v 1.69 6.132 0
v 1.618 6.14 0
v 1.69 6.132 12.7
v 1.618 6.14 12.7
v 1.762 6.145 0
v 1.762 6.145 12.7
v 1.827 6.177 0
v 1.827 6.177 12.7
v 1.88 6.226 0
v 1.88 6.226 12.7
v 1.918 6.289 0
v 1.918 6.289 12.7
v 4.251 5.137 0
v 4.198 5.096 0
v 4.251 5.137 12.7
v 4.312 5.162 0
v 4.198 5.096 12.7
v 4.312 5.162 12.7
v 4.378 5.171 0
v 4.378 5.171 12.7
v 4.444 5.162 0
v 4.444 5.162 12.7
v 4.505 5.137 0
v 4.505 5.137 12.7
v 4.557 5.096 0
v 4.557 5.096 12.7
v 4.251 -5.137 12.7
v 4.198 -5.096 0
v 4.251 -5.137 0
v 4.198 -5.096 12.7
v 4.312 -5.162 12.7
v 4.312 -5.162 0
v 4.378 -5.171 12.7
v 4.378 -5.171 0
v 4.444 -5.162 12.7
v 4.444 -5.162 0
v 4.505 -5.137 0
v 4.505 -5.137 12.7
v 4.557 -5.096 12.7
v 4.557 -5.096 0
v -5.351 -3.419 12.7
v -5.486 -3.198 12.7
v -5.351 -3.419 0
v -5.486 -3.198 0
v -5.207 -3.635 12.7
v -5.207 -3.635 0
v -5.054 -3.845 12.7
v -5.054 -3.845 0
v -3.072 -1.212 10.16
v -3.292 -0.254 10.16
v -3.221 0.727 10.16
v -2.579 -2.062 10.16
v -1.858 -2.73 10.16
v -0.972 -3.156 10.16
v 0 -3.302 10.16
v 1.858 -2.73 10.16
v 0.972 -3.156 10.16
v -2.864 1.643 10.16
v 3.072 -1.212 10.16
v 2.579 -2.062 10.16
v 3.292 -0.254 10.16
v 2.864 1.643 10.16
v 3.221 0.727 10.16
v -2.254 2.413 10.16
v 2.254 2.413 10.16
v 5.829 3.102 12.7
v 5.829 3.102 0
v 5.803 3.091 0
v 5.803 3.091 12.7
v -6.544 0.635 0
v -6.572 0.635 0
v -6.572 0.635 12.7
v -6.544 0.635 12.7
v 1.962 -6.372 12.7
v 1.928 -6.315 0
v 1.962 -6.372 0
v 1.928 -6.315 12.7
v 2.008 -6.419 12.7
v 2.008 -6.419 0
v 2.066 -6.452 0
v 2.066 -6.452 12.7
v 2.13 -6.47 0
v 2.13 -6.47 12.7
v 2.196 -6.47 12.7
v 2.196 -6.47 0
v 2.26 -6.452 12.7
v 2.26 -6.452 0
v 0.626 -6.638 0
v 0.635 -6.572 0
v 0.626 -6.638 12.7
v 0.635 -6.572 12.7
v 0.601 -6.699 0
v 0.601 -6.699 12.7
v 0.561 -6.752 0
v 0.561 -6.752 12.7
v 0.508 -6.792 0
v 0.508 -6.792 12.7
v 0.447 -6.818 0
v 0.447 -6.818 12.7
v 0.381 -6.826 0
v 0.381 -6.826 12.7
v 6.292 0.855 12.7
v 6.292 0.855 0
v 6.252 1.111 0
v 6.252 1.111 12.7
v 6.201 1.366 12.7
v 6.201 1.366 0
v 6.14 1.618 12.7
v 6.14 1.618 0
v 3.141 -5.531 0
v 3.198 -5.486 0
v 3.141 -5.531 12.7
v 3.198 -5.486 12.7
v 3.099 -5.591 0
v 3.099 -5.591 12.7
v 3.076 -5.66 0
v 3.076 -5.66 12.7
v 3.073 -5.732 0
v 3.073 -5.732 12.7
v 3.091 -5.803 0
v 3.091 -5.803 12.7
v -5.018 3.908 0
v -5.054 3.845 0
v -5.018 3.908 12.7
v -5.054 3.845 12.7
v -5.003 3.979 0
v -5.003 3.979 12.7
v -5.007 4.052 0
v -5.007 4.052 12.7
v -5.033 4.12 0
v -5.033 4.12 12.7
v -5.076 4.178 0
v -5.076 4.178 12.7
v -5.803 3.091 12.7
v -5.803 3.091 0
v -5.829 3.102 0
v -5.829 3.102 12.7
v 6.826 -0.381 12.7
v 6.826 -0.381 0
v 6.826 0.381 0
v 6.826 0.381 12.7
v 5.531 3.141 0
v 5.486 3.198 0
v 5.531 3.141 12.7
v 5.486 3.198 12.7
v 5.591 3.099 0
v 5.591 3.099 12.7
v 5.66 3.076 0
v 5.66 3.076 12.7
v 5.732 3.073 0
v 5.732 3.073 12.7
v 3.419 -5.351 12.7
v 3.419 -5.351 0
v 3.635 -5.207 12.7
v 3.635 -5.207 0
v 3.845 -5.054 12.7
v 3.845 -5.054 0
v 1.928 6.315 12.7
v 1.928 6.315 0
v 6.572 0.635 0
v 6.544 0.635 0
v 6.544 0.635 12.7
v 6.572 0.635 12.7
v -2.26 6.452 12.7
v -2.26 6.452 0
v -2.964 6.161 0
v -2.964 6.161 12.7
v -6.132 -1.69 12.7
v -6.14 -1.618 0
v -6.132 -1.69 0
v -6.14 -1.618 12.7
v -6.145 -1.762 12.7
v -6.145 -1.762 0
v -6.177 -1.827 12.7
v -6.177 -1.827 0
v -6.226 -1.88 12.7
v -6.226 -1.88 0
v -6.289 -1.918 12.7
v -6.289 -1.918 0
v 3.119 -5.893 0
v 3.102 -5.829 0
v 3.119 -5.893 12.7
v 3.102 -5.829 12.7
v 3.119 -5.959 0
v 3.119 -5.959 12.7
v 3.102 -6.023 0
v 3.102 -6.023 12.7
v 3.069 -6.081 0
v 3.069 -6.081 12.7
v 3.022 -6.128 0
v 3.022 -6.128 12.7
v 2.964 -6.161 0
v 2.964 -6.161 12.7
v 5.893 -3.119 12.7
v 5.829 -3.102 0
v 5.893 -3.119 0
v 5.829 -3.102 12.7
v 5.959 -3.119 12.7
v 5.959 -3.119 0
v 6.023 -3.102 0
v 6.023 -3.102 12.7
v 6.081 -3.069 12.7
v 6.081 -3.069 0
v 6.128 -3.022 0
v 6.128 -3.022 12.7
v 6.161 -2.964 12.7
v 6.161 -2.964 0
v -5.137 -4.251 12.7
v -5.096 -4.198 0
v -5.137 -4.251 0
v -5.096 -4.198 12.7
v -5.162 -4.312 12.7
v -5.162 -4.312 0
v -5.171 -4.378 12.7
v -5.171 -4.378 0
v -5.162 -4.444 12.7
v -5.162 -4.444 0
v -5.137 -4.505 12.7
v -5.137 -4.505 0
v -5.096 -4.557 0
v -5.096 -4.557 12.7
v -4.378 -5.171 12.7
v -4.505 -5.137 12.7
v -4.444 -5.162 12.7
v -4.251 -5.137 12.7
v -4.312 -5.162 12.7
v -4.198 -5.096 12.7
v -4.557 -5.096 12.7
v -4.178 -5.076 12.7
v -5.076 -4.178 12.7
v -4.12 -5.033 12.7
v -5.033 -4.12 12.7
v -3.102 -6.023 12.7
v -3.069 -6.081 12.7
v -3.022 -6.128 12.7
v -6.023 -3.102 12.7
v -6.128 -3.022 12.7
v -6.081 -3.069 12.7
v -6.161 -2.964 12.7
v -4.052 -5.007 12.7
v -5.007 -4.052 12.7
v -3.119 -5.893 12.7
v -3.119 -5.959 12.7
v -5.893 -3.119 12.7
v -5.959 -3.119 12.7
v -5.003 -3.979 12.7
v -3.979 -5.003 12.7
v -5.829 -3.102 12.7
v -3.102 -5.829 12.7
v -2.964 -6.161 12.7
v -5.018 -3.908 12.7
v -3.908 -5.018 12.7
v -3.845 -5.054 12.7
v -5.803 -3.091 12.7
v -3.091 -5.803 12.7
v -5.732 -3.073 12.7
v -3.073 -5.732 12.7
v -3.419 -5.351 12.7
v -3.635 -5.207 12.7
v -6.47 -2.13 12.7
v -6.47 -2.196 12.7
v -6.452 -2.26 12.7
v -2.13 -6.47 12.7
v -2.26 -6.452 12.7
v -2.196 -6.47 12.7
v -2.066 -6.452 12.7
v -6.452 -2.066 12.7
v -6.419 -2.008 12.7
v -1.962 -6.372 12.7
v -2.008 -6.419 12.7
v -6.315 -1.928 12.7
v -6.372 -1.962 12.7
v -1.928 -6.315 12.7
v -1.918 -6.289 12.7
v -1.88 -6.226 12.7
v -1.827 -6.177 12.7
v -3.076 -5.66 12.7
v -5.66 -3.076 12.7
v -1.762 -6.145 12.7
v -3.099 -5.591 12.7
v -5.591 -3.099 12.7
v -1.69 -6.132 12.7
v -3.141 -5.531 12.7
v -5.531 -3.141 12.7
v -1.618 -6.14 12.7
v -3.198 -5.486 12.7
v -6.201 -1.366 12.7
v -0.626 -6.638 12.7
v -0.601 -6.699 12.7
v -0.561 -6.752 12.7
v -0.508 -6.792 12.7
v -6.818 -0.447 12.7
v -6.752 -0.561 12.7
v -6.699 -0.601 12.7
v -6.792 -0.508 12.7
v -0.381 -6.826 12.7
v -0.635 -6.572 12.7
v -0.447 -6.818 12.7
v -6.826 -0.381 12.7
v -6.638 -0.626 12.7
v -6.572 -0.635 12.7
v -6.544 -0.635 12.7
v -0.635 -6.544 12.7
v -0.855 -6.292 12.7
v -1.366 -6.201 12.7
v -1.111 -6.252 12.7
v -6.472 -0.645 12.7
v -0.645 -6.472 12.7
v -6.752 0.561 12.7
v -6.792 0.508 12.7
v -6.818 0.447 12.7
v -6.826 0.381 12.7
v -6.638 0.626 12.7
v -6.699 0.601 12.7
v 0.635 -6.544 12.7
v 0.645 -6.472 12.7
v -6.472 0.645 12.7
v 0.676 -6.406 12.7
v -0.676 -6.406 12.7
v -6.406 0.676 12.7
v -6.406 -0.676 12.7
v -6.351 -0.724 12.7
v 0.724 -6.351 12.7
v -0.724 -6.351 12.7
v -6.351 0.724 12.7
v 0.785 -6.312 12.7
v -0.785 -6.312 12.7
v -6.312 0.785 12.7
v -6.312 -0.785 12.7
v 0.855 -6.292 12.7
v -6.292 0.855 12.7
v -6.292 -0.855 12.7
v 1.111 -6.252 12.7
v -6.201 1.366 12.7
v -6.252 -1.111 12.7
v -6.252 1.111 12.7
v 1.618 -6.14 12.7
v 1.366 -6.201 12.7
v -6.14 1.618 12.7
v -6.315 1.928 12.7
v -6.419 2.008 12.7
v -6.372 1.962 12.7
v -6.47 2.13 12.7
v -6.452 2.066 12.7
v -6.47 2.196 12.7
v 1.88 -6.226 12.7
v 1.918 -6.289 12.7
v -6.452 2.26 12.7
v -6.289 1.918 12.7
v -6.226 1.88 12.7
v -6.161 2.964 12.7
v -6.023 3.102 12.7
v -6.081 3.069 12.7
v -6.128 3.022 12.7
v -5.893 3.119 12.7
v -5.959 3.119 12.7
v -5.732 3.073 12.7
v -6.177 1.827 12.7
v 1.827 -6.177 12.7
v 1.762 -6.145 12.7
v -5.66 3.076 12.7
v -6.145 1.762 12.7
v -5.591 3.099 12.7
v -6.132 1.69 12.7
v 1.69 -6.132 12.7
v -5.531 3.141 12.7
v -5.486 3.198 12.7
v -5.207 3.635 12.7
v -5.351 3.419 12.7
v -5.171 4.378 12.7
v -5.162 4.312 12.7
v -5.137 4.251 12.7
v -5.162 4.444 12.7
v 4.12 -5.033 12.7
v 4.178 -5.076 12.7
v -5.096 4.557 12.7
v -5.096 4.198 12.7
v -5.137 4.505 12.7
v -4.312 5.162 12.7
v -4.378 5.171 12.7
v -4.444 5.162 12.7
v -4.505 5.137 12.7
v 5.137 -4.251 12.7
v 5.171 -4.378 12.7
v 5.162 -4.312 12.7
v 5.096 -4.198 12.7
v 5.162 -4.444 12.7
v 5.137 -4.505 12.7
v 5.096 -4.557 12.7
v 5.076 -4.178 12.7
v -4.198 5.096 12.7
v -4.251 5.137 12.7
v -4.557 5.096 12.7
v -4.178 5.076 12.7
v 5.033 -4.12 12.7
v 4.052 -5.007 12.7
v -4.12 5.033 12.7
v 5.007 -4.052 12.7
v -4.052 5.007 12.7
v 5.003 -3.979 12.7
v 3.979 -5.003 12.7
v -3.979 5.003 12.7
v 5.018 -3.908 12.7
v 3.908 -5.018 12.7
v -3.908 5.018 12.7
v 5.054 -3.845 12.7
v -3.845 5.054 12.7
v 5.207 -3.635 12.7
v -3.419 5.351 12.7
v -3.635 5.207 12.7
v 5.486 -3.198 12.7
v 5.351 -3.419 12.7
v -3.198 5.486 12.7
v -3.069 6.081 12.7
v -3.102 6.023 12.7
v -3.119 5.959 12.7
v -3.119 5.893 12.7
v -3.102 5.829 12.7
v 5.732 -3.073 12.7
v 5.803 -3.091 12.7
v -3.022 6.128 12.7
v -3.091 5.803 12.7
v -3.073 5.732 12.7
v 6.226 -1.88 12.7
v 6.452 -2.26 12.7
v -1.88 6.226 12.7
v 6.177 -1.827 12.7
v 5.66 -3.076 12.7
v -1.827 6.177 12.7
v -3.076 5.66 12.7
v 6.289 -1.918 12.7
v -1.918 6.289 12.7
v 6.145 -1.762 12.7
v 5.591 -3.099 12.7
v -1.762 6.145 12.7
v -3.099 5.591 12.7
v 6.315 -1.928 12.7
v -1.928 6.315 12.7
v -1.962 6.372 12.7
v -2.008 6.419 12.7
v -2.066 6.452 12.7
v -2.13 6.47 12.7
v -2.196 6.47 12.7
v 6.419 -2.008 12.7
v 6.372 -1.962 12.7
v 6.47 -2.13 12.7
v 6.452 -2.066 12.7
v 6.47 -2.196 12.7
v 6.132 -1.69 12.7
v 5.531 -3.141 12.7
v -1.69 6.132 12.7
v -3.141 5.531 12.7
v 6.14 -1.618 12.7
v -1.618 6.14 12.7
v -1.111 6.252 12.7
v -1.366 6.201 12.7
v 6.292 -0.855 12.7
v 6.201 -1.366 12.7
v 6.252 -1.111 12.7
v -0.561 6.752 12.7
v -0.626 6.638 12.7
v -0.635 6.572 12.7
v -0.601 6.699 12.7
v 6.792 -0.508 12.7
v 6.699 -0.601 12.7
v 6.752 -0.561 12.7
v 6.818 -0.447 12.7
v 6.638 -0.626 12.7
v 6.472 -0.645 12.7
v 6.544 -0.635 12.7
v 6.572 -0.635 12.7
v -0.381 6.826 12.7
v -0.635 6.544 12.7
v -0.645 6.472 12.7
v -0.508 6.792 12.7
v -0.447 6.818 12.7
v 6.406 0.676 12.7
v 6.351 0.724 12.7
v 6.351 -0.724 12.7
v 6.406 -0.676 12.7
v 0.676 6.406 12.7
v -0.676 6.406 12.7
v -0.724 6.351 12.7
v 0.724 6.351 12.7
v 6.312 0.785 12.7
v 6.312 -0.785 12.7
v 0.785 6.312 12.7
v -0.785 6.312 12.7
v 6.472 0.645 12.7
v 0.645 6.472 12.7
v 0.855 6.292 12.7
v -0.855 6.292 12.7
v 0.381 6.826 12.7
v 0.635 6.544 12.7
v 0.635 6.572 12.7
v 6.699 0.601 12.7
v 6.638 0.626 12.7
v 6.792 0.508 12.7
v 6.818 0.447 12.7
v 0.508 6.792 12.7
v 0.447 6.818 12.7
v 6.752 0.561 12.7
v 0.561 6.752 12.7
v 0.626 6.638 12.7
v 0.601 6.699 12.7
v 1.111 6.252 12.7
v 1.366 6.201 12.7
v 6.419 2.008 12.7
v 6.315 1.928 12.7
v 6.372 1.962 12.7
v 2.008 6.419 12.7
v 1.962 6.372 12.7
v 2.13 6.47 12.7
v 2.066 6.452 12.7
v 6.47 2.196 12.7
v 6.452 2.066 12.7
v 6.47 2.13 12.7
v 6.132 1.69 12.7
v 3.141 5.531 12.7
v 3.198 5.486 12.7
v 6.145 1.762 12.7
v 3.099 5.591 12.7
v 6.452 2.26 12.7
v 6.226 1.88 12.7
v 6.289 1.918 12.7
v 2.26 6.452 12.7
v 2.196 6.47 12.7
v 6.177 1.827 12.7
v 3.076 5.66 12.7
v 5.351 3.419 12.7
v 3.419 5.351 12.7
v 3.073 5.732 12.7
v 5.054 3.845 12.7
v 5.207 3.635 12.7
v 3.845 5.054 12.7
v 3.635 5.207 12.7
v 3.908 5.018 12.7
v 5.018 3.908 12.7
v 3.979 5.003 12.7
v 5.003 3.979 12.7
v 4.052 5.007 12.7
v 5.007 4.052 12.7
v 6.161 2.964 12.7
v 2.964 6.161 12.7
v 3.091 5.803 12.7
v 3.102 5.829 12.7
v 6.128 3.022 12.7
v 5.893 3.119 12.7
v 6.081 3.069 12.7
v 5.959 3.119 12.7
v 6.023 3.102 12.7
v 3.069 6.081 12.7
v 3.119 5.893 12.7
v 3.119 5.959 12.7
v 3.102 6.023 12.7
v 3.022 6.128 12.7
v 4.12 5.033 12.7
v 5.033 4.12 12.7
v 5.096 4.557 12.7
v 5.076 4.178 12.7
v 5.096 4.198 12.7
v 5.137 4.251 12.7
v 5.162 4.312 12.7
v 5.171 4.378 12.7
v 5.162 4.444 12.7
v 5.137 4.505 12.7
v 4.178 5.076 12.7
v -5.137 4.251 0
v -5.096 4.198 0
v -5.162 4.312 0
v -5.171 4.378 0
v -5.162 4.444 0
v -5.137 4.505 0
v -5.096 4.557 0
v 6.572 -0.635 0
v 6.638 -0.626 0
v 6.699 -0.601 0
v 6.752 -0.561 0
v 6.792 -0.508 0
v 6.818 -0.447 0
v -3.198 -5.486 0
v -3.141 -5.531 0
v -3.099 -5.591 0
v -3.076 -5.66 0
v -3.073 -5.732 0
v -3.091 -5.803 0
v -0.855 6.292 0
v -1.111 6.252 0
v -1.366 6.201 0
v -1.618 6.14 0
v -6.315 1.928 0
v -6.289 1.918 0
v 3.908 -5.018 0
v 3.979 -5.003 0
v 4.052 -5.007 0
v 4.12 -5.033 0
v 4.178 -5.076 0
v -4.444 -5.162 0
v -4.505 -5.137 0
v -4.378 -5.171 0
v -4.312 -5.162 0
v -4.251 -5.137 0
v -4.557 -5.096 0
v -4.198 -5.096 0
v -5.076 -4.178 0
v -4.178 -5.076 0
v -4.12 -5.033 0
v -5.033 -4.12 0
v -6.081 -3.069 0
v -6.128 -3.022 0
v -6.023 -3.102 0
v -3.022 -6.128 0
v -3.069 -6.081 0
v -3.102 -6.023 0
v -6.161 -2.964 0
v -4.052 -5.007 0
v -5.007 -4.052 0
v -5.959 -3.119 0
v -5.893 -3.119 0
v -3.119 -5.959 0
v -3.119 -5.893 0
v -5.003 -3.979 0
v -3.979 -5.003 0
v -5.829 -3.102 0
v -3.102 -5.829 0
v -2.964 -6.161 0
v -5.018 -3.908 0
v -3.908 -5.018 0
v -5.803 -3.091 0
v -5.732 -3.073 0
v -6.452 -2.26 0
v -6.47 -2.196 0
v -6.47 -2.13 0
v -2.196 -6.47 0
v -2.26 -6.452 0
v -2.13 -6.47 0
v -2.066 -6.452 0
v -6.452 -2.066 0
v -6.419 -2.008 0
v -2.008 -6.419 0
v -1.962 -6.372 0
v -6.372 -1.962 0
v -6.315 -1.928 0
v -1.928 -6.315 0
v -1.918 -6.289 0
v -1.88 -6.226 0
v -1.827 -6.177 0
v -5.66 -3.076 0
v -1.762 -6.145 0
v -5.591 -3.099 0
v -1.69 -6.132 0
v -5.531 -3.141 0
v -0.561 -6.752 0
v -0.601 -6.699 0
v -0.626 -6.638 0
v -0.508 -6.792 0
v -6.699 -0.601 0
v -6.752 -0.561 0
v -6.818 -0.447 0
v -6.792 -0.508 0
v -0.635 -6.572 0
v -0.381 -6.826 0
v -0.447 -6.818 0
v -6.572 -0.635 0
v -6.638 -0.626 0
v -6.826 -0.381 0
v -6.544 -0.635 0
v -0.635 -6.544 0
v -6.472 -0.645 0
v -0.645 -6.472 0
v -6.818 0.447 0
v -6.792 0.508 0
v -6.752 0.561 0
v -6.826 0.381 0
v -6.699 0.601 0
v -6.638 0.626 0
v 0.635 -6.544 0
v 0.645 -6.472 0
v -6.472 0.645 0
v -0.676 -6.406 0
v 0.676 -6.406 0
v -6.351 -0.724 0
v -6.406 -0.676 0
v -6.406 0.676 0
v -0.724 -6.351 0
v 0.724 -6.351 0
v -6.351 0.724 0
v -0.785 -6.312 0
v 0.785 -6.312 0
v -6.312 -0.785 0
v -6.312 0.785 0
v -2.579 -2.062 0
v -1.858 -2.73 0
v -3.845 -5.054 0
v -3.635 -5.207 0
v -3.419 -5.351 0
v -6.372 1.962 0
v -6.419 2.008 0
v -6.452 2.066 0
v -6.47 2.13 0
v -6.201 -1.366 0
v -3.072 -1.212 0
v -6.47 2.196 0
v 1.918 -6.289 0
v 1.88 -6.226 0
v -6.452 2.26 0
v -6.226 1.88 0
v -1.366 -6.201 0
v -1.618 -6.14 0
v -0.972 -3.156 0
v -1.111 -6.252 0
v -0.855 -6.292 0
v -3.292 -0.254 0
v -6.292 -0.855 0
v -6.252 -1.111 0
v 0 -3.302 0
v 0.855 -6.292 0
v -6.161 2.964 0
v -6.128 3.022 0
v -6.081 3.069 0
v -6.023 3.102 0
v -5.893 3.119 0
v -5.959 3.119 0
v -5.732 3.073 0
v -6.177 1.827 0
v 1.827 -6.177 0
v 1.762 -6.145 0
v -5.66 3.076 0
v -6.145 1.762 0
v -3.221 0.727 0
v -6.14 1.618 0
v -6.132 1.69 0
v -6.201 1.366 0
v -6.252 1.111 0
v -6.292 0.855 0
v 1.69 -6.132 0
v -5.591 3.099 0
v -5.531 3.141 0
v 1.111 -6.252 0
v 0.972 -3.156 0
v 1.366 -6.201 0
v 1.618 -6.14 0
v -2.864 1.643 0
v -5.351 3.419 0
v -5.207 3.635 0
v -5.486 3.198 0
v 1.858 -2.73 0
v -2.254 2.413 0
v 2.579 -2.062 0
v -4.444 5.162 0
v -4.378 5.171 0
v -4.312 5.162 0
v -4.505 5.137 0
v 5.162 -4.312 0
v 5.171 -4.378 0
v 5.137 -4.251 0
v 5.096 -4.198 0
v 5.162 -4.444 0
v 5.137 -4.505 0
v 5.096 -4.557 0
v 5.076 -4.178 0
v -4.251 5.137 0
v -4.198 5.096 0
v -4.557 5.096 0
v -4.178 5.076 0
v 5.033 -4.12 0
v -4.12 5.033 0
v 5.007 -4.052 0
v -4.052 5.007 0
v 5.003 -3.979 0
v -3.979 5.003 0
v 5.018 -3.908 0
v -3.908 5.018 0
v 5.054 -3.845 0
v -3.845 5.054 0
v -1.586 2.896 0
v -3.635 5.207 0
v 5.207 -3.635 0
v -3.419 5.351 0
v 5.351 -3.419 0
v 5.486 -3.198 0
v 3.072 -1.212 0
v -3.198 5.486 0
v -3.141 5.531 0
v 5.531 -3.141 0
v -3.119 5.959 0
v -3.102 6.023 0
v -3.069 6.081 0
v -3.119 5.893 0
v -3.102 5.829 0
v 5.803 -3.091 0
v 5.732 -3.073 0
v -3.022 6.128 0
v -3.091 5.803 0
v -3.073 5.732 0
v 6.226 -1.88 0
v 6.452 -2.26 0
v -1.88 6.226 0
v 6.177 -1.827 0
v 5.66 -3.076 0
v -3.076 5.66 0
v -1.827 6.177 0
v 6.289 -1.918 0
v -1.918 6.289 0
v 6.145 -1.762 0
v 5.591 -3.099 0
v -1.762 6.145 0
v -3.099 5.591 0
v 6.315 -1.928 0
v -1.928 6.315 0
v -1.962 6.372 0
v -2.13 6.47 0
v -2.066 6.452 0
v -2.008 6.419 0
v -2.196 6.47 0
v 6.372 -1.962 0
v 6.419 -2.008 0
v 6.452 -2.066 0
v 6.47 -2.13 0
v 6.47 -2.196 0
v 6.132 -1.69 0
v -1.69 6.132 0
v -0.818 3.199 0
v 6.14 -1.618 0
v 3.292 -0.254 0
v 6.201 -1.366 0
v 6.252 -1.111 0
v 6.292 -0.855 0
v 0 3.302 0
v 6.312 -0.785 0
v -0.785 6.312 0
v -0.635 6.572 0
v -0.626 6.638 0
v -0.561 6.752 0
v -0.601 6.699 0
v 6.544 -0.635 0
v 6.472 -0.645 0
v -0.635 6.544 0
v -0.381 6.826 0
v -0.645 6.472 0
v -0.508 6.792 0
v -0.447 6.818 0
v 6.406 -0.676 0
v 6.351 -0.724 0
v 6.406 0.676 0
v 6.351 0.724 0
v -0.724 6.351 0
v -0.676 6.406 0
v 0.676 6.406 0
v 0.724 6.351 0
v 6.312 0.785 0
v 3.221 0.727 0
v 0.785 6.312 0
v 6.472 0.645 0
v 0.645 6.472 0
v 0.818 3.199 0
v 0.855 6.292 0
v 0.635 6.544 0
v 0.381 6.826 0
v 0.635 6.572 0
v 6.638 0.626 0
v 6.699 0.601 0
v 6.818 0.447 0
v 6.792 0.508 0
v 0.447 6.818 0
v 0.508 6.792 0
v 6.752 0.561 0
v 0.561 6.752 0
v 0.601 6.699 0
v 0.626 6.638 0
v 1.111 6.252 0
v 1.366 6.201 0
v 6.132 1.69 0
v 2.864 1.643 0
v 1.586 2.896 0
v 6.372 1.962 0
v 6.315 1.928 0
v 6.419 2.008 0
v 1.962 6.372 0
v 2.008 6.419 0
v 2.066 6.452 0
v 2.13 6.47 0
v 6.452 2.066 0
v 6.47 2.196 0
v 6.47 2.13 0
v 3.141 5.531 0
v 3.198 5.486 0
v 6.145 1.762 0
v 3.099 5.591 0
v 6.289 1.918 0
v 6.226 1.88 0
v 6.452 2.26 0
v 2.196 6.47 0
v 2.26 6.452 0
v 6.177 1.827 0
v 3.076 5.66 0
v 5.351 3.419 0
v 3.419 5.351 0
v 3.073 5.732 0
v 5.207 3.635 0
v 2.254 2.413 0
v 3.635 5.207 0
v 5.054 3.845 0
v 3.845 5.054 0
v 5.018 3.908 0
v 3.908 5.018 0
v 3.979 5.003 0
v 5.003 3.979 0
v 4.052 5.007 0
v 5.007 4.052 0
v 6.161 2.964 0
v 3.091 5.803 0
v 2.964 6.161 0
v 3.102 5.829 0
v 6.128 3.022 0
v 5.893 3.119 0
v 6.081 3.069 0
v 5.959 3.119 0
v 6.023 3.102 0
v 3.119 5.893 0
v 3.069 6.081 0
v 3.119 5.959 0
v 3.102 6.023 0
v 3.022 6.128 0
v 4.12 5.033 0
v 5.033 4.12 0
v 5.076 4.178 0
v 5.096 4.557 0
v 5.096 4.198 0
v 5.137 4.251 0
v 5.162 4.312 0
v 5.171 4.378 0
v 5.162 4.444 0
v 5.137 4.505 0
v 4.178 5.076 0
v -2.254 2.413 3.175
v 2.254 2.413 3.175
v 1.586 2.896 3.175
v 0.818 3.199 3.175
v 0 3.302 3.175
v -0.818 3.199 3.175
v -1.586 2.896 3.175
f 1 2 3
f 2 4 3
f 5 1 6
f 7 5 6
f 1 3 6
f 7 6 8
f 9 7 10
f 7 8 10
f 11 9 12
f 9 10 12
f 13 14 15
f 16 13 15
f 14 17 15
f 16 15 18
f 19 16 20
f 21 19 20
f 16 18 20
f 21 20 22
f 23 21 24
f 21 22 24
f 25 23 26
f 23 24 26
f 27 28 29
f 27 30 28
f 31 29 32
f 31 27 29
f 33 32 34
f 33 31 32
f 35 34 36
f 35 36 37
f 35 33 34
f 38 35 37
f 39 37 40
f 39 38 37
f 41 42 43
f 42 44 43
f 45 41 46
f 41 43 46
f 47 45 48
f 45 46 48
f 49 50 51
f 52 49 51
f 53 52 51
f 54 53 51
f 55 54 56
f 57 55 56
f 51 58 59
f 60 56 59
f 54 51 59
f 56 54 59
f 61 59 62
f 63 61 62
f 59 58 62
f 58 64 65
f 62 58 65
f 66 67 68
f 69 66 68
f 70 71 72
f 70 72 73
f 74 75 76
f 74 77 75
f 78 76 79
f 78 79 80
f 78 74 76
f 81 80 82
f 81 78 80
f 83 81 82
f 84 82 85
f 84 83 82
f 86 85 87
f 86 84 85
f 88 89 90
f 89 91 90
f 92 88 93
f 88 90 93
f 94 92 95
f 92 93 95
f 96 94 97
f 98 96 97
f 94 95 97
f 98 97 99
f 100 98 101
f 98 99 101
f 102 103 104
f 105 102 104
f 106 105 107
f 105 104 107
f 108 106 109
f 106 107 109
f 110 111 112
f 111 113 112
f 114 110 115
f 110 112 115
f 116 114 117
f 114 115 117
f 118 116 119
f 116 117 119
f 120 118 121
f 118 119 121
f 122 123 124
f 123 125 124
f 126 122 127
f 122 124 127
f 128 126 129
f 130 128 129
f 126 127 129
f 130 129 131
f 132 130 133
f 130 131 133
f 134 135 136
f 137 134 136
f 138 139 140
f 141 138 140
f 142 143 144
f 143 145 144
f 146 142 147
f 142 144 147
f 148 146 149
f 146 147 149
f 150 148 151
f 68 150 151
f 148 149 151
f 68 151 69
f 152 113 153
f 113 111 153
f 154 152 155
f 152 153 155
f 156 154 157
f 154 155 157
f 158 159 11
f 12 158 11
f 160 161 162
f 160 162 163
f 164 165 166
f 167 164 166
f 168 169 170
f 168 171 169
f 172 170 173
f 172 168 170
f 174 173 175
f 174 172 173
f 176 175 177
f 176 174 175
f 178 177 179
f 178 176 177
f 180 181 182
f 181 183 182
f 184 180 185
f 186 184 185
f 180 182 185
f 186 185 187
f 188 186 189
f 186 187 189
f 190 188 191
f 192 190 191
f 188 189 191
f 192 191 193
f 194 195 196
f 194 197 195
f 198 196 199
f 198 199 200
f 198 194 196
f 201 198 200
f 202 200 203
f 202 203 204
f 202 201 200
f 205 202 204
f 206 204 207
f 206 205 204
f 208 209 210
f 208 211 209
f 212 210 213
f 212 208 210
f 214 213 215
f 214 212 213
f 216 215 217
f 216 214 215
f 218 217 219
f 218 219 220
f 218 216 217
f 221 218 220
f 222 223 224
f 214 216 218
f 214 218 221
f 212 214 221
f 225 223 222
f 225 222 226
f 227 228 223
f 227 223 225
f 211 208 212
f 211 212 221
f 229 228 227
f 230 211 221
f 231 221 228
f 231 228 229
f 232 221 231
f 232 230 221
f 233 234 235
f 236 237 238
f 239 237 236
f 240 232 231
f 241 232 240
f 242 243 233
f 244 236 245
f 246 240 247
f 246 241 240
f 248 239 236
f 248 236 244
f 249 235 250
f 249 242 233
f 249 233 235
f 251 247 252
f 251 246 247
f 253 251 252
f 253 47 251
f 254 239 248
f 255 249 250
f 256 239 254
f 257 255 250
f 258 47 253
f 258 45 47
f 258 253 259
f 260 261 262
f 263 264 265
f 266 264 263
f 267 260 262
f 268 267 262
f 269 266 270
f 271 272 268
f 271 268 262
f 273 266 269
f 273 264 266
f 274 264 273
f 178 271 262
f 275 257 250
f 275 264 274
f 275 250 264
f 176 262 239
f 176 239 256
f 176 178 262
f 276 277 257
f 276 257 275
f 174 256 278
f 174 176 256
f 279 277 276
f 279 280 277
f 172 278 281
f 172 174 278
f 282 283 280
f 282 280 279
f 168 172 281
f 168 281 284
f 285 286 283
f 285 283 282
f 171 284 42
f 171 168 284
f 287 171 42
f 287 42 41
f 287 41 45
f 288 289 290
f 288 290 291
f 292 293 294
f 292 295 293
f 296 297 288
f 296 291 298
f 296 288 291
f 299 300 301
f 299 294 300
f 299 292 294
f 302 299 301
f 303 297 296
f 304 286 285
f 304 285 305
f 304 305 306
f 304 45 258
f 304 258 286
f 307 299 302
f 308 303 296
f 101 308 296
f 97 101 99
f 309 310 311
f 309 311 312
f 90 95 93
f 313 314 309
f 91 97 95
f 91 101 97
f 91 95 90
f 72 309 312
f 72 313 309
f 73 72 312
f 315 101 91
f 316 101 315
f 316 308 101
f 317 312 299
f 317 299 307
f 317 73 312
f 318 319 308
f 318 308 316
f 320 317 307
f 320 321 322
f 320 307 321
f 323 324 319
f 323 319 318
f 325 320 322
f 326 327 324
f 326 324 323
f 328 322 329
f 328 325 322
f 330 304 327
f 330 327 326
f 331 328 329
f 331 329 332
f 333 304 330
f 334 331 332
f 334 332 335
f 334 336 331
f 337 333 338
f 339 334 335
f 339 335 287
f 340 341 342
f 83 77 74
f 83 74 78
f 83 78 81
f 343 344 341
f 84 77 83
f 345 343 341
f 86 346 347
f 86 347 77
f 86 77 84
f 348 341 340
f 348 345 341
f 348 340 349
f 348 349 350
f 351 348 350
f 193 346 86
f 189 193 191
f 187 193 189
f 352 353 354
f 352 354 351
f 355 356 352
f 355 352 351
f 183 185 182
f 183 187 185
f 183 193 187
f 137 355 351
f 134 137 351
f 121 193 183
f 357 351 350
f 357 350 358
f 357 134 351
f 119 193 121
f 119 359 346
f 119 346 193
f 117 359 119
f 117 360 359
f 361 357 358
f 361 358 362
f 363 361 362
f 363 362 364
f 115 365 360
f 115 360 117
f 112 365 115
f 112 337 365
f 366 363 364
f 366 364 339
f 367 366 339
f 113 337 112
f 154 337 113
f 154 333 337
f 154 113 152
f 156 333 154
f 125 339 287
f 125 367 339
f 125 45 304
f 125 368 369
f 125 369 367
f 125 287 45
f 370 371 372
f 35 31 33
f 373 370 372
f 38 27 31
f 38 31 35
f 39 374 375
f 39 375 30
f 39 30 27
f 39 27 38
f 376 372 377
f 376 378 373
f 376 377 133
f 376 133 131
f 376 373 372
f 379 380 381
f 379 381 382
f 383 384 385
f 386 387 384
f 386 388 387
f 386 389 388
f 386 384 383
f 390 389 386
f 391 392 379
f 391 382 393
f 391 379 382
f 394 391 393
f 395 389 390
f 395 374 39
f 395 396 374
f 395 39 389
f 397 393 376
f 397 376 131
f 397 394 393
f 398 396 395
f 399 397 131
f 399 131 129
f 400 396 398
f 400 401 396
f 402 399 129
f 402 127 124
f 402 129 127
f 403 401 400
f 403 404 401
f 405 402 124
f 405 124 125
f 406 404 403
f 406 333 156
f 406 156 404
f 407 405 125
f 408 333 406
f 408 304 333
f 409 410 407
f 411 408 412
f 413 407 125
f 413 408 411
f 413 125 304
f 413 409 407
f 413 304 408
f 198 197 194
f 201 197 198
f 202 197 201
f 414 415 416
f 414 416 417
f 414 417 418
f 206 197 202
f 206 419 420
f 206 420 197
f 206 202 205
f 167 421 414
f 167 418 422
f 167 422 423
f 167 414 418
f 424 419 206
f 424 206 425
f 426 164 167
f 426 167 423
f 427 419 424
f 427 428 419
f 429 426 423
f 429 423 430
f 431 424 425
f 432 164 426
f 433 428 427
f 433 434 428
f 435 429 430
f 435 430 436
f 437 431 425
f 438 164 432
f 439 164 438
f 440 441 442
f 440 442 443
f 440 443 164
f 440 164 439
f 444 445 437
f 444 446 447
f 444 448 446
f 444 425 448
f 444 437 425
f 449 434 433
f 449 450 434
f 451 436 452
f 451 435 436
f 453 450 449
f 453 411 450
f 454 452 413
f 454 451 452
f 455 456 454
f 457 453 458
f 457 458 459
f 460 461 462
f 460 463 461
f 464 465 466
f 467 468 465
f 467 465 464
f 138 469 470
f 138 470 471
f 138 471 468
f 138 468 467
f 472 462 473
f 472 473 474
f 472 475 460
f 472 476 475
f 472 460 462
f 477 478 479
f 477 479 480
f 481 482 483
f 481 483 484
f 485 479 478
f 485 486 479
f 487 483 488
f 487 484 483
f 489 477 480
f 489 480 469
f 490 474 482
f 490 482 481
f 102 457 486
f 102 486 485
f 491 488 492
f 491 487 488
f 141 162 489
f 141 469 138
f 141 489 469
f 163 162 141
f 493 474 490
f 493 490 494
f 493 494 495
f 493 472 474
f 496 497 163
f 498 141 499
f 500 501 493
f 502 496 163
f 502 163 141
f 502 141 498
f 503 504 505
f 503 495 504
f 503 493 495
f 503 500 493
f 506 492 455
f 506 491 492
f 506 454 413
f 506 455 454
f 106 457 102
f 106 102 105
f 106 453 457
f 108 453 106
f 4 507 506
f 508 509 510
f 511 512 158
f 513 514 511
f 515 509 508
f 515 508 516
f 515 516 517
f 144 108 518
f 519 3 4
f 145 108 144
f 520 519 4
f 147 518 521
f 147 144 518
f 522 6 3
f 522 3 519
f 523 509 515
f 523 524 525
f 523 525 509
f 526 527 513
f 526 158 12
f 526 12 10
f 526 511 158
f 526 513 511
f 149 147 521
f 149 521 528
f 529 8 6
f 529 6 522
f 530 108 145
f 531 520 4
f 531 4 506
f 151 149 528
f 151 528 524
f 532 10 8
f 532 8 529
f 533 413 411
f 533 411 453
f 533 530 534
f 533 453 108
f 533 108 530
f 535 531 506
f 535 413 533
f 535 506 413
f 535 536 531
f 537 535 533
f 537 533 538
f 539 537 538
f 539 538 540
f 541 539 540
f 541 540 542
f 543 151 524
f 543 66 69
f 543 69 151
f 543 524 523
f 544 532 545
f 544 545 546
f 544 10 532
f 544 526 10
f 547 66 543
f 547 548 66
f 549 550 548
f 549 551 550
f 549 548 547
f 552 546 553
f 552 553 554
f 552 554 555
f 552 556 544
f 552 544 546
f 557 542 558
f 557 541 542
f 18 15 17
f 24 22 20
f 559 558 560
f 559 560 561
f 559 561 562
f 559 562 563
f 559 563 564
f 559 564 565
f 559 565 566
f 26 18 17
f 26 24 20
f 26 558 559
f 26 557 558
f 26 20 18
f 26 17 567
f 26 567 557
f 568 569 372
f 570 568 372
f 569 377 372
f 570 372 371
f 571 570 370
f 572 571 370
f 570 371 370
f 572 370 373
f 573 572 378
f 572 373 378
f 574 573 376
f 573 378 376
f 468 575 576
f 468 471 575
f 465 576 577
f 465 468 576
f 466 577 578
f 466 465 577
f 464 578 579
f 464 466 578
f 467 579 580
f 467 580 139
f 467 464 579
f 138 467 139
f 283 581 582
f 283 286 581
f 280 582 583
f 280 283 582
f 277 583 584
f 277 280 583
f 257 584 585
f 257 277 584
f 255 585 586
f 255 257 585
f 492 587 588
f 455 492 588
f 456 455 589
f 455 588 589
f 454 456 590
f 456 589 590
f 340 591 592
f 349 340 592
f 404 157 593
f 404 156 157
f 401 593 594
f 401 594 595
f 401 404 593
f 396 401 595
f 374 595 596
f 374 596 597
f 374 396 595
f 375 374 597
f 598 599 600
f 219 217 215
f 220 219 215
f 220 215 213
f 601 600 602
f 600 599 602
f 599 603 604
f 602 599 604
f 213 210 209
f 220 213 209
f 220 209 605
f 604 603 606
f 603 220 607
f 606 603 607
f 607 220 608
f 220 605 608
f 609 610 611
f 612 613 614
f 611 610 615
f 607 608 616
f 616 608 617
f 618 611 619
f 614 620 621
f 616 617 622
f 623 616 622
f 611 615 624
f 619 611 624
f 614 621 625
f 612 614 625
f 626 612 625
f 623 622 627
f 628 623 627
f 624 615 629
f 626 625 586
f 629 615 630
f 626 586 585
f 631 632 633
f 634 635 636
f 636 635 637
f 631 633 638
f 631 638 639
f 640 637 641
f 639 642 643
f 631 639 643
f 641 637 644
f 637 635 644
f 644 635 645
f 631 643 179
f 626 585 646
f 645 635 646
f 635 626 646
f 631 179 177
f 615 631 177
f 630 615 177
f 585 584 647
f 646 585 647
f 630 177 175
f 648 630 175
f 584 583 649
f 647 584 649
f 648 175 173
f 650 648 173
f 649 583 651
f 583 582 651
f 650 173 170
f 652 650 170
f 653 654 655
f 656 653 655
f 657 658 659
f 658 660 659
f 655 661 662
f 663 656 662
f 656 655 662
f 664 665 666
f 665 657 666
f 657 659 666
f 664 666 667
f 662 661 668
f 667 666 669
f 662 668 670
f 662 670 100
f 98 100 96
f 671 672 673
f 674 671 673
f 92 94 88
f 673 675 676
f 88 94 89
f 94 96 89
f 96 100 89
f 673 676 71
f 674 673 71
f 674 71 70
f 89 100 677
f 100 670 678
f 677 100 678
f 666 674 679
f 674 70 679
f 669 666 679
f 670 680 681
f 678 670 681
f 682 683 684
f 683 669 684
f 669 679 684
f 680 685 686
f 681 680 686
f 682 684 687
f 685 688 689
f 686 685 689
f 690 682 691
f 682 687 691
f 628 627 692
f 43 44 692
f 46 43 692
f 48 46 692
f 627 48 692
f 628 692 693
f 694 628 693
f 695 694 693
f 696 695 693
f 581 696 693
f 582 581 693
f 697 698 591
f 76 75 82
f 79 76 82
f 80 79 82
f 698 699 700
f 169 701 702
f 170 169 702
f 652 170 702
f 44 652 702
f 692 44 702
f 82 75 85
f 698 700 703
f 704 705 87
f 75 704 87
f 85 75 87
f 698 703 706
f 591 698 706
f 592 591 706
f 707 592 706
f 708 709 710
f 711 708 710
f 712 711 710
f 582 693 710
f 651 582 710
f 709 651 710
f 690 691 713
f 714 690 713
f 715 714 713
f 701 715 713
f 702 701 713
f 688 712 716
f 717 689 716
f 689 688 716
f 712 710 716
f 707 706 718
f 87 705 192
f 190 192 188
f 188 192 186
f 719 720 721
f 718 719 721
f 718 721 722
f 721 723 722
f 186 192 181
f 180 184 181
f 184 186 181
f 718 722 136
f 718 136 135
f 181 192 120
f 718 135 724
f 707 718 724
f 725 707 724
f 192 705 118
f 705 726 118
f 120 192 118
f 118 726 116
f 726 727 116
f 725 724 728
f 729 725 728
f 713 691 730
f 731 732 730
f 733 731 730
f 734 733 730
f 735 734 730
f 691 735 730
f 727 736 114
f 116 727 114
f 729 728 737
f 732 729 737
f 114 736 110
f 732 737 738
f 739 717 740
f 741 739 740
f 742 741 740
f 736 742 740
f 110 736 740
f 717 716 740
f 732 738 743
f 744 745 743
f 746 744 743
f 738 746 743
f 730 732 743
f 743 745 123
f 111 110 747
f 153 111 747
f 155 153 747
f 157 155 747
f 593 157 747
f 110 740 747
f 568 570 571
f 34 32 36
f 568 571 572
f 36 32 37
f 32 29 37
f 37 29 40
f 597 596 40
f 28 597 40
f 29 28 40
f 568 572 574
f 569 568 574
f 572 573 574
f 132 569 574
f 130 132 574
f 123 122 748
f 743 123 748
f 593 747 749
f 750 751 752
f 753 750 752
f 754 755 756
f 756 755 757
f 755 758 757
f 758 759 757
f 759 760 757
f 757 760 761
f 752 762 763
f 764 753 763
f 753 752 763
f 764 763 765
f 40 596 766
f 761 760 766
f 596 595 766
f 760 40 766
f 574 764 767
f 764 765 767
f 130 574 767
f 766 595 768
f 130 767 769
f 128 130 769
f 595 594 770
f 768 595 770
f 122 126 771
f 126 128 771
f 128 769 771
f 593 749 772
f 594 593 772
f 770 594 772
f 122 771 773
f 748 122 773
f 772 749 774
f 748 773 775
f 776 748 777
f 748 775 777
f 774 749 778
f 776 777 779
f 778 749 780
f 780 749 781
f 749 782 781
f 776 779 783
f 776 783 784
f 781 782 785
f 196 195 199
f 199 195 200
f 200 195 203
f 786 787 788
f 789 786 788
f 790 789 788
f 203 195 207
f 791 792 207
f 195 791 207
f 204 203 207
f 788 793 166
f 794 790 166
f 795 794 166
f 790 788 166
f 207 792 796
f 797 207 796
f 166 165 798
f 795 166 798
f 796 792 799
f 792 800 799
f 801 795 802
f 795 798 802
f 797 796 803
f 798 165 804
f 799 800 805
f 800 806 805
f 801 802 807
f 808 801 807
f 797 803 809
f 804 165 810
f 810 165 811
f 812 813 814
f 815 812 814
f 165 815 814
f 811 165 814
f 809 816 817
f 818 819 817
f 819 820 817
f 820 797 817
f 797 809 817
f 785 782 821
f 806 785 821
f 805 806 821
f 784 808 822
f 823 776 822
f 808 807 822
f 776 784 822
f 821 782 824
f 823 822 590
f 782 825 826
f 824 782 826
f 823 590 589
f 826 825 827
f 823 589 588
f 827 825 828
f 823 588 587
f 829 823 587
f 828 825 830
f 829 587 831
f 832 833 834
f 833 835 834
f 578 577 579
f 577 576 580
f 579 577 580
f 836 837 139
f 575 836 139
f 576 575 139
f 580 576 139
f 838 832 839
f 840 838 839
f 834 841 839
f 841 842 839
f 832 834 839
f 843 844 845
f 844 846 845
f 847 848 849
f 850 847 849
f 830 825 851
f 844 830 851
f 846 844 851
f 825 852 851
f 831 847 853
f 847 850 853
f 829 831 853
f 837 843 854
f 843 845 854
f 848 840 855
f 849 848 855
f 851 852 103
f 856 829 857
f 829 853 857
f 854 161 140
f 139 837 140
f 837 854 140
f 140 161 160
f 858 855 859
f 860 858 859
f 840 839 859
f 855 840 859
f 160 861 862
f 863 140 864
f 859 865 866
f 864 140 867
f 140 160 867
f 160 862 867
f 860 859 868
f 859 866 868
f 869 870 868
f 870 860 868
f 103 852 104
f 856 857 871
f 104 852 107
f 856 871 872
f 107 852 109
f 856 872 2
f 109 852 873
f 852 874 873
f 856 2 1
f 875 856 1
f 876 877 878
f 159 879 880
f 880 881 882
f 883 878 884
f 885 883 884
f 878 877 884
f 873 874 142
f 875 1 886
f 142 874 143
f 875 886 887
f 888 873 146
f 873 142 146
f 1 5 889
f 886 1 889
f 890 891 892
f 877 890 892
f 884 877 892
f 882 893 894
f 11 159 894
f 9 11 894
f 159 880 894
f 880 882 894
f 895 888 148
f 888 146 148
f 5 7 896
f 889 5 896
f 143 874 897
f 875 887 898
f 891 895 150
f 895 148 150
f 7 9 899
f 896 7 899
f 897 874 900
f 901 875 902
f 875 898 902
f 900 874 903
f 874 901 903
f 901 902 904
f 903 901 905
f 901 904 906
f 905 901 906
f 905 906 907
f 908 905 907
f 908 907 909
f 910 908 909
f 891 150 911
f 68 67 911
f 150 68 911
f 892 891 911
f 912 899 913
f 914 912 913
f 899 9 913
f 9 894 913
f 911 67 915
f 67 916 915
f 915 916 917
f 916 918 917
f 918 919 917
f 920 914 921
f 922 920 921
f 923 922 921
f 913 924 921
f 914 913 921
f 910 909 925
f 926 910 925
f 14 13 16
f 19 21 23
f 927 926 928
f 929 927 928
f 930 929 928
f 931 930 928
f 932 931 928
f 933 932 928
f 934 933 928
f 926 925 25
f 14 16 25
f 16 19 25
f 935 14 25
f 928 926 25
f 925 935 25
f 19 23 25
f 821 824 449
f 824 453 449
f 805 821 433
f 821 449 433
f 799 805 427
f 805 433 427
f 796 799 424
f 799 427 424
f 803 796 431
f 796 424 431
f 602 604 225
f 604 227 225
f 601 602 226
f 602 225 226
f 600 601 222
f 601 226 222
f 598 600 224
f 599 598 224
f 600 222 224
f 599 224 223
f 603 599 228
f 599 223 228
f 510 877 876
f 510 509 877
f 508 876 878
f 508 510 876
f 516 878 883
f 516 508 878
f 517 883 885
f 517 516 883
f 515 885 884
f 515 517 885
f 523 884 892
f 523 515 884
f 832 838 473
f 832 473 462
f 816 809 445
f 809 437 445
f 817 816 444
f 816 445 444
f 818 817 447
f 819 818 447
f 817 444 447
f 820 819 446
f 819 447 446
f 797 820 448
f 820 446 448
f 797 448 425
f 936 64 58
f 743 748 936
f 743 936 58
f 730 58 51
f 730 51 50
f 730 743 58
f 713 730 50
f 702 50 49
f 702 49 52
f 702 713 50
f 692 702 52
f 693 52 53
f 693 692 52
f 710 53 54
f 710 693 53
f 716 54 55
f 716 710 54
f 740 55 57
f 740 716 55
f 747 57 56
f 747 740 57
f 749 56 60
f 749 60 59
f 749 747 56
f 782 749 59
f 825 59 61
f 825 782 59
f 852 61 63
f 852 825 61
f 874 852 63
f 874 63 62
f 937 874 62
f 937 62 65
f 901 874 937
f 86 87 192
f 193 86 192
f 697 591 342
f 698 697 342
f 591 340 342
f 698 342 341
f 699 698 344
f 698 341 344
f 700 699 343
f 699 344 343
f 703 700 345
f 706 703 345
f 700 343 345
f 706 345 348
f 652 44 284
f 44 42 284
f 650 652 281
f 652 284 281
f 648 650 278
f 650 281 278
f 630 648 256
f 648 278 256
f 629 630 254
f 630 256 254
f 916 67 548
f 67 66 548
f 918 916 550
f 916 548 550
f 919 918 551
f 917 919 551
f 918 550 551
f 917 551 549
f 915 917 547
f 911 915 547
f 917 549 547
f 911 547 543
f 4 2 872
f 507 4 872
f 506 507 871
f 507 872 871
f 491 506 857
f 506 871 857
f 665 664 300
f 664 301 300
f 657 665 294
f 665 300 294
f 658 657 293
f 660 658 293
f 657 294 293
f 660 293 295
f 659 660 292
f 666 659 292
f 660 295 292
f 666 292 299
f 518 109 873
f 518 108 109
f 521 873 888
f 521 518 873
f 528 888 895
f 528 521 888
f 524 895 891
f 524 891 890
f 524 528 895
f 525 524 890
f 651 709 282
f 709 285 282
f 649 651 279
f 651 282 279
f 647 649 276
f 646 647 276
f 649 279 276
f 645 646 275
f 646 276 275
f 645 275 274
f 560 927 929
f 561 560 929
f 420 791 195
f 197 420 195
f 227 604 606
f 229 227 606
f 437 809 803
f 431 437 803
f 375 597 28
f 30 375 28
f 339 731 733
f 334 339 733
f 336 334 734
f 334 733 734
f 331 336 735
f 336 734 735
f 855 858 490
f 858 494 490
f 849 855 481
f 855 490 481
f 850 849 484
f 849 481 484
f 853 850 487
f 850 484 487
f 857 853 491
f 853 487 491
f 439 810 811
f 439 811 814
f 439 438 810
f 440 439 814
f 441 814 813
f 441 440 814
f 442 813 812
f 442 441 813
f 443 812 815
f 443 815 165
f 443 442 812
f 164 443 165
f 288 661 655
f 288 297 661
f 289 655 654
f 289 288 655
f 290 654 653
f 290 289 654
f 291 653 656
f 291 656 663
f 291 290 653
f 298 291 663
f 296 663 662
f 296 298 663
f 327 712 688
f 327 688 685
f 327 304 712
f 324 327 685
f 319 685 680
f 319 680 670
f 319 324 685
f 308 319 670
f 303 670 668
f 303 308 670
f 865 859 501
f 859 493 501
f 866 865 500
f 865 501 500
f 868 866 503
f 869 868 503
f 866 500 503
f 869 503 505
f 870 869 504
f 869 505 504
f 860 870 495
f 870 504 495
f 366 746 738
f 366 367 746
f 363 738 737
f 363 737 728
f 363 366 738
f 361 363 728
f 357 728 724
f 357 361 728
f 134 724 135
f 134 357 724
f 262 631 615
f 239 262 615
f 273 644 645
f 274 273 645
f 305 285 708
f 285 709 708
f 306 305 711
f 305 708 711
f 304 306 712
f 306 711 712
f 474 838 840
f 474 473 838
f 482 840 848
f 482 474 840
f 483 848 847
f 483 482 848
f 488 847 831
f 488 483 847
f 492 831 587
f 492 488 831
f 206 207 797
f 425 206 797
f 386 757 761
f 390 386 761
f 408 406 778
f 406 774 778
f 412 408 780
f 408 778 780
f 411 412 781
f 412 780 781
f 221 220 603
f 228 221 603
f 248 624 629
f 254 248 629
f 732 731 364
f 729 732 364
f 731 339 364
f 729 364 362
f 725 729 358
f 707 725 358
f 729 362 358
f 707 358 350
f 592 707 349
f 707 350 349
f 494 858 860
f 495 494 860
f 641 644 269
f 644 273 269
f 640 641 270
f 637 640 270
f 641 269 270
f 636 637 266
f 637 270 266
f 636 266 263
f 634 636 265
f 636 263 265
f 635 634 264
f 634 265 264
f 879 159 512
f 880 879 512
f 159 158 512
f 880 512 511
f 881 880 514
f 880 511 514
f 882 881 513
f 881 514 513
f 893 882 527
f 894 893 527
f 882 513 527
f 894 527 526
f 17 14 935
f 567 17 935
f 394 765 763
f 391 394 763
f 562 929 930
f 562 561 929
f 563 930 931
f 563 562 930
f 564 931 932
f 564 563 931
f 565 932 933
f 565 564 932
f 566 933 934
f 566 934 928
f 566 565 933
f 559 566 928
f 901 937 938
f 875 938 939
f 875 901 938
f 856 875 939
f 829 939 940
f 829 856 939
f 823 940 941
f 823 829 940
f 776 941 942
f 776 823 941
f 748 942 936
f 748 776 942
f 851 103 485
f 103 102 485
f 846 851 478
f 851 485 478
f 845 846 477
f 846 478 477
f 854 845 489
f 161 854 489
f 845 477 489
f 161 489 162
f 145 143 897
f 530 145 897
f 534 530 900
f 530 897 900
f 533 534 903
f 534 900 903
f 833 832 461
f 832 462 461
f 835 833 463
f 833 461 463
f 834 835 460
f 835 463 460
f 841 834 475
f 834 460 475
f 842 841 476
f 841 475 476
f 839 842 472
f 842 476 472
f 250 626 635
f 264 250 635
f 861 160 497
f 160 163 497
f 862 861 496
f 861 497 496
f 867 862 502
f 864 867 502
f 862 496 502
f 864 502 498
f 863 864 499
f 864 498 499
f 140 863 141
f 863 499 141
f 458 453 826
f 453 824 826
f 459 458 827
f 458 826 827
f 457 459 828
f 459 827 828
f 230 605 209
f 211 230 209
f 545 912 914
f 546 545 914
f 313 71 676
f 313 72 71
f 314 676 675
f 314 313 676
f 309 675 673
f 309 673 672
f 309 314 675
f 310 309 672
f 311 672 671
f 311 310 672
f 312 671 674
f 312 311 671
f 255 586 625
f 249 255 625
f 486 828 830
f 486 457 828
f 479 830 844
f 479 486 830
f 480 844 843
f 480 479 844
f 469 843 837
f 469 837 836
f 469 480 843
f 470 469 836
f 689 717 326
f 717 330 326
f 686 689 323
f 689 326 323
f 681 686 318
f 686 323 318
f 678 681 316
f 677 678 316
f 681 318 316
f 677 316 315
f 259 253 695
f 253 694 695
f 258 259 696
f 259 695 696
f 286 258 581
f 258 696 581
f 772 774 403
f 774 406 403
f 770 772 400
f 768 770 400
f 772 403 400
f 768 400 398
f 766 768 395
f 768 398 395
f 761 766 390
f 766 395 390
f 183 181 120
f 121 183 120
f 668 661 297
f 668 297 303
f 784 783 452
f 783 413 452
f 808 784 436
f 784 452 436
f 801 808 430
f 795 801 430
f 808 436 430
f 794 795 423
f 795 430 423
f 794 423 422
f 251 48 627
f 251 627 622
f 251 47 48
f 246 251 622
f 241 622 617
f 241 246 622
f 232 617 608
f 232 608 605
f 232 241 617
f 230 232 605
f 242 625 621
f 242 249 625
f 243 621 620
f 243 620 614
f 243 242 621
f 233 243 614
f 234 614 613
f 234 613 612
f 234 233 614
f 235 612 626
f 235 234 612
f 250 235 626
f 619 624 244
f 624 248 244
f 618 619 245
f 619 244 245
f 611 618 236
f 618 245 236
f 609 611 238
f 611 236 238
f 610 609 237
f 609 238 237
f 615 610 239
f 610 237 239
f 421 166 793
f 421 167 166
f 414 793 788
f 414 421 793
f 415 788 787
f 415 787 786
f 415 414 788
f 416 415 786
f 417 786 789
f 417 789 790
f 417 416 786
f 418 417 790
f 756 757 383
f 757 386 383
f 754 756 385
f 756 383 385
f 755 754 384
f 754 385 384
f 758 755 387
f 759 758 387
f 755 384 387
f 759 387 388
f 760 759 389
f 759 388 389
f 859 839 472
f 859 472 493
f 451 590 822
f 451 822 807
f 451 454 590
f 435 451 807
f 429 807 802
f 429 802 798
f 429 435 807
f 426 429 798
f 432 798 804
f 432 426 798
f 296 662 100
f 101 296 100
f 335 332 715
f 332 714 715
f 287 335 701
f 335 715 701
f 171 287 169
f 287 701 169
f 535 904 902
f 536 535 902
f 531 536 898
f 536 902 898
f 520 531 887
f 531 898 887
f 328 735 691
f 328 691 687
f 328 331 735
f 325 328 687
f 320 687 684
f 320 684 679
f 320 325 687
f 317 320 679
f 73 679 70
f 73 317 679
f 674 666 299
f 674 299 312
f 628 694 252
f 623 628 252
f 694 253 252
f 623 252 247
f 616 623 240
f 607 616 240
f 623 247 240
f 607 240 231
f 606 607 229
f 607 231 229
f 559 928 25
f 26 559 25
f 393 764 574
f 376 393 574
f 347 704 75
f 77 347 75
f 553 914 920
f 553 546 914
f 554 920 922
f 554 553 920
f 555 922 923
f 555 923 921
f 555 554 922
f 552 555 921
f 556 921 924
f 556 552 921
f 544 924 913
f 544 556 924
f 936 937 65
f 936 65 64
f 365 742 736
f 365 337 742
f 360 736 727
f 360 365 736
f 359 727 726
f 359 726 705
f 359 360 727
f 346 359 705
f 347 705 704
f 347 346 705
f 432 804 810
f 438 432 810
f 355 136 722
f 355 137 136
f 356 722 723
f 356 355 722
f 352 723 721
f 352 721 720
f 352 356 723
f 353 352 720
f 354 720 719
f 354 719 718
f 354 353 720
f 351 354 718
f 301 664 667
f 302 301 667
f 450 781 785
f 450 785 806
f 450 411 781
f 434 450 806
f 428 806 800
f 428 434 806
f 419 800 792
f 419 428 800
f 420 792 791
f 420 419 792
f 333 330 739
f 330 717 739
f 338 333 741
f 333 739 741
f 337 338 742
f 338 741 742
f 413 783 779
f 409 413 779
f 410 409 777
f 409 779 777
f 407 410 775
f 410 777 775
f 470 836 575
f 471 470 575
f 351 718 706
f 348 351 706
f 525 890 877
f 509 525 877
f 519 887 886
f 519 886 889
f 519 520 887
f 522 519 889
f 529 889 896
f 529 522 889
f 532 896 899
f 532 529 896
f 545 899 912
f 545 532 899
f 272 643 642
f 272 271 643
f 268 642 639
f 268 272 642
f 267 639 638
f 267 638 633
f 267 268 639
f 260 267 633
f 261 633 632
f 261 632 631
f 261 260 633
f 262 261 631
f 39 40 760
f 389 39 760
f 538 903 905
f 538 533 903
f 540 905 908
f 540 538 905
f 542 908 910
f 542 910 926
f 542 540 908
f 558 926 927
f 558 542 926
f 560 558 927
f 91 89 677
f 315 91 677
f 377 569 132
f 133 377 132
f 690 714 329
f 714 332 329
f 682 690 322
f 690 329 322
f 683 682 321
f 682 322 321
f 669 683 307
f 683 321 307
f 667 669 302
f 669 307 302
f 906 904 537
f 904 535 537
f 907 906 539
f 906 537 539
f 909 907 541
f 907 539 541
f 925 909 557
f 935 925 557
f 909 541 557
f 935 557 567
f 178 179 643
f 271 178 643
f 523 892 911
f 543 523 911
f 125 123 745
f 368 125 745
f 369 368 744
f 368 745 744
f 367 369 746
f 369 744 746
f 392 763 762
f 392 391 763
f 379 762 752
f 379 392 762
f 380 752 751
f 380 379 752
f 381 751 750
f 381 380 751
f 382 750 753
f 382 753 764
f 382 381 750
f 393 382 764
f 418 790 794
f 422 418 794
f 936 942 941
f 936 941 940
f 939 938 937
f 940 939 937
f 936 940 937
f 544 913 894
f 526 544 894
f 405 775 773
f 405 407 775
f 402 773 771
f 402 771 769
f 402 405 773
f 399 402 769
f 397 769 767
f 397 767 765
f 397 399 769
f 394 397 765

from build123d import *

# Parameters (mm, degrees)
F0_R     = 6.35
F1_DEPTH = 12.7
F2_W     = 1.27
F2_H     = 0.508
F2_W_2   = 0.508
F2_H_2   = 1.27
F3_DEPTH = 12.7
F4_R     = 0.254
F6_DEPTH = 10.16
F7_R     = 3.302
F8_DEPTH = 3.175


with BuildPart() as f1:
    # F0 (on Top) → F1 (new body)
    with BuildSketch(Plane.XY):
        Circle(F0_R)
    extrude(amount=F1_DEPTH)

    # F2 (on Top) → F3 (join, through all)
    with BuildSketch(Plane.XY):
        with Locations((0, 6.57217)):
            Rectangle(F2_W, F2_H)
        Polygon((-2.025599, 6.549563), (-3.198926, 6.063555), (-3.004523, 5.594224), (-1.831196, 6.080232), align=None)
        Polygon((-4.377818, 5.275844), (-5.275844, 4.377818), (-4.916634, 4.018608), (-4.018608, 4.916634), align=None)
        Polygon((-6.063555, 3.198926), (-6.549563, 2.025599), (-6.080232, 1.831196), (-5.594224, 3.004523), align=None)
        with Locations((-6.57217, 0)):
            Rectangle(F2_W_2, F2_H_2)
        Polygon((-6.549563, -2.025599), (-6.063555, -3.198926), (-5.594224, -3.004523), (-6.080232, -1.831196), align=None)
        Polygon((-5.275844, -4.377818), (-4.377818, -5.275844), (-4.018608, -4.916634), (-4.916634, -4.018608), align=None)
        Polygon((-3.198926, -6.063555), (-2.025599, -6.549563), (-1.831196, -6.080232), (-3.004523, -5.594224), align=None)
        with Locations((0, -6.57217)):
            Rectangle(F2_W, F2_H)
        Polygon((2.025599, -6.549563), (3.198926, -6.063555), (3.004523, -5.594224), (1.831196, -6.080232), align=None)
        Polygon((4.377818, -5.275844), (5.275844, -4.377818), (4.916634, -4.018608), (4.018608, -4.916634), align=None)
        Polygon((6.063555, -3.198926), (6.549563, -2.025599), (6.080232, -1.831196), (5.594224, -3.004523), align=None)
        with Locations((6.57217, 0)):
            Rectangle(F2_W_2, F2_H_2)
        Polygon((6.549563, 2.025599), (6.063555, 3.198926), (5.594224, 3.004523), (6.080232, 1.831196), align=None)
        Polygon((5.275844, 4.377818), (4.377818, 5.275844), (4.018608, 4.916634), (4.916634, 4.018608), align=None)
        Polygon((3.198926, 6.063555), (2.025599, 6.549563), (1.831196, 6.080232), (3.004523, 5.594224), align=None)
    extrude(amount=F3_DEPTH)

    # F4
    f4_edges = [f1.edges().sort_by_distance(p)[0] for p in [
        (0.635, 6.82617, 6.35),
        (-0.635, 6.82617, 6.35),
        (0.635, 6.31817, 6.35),
        (-0.635, 6.31817, 6.35),
        (1.831196, 6.080232, 6.35),
        (2.025599, 6.549563, 6.35),
        (3.198926, 6.063555, 6.35),
        (3.004523, 5.594224, 6.35),
        (4.377818, 5.275844, 6.35),
        (5.275844, 4.377818, 6.35),
        (4.018608, 4.916634, 6.35),
        (4.916634, 4.018608, 6.35),
        (5.594224, 3.004523, 6.35),
        (6.063555, 3.198926, 6.35),
        (6.549563, 2.025599, 6.35),
        (6.080232, 1.831196, 6.35),
        (6.82617, 0.635, 6.35),
        (6.31817, 0.635, 6.35),
        (6.82617, -0.635, 6.35),
        (6.31817, -0.635, 6.35),
        (6.549563, -2.025599, 6.35),
        (6.080232, -1.831196, 6.35),
        (6.063555, -3.198926, 6.35),
        (5.275844, -4.377818, 6.35),
        (5.594224, -3.004523, 6.35),
        (4.916634, -4.018608, 6.35),
        (4.377818, -5.275844, 6.35),
        (4.018608, -4.916634, 6.35),
        (3.004523, -5.594224, 6.35),
        (3.198926, -6.063555, 6.35),
        (0.635, -6.31817, 6.35),
        (0.635, -6.82617, 6.35),
        (1.831196, -6.080232, 6.35),
        (2.025599, -6.549563, 6.35),
        (-0.635, -6.82617, 6.35),
        (-0.635, -6.31817, 6.35),
        (-1.831196, -6.080232, 6.35),
        (-2.025599, -6.549563, 6.35),
        (-3.198926, -6.063555, 6.35),
        (-3.004523, -5.594224, 6.35),
        (-4.018608, -4.916634, 6.35),
        (-4.377818, -5.275844, 6.35),
        (-5.594224, -3.004523, 6.35),
        (-6.063555, -3.198926, 6.35),
        (-5.275844, -4.377818, 6.35),
        (-4.916634, -4.018608, 6.35),
        (-6.080232, -1.831196, 6.35),
        (-6.549563, -2.025599, 6.35),
        (-6.31817, -0.635, 6.35),
        (-6.82617, -0.635, 6.35),
        (-6.82617, 0.635, 6.35),
        (-6.31817, 0.635, 6.35),
        (-6.080232, 1.831196, 6.35),
        (-6.549563, 2.025599, 6.35),
        (-6.063555, 3.198926, 6.35),
        (-5.594224, 3.004523, 6.35),
        (-4.377818, 5.275844, 6.35),
        (-4.018608, 4.916634, 6.35),
        (-4.916634, 4.018608, 6.35),
        (-5.275844, 4.377818, 6.35),
        (-1.831196, 6.080232, 6.35),
        (-2.025599, 6.549563, 6.35),
        (-3.004523, 5.594224, 6.35),
        (-3.198926, 6.063555, 6.35),
    ]]
    fillet(f4_edges, radius=F4_R)

    # F5 (on Top) → F6 (cut)
    with BuildSketch(Plane.XY):
        with BuildLine():
            Line((2.254026, 2.413), (-2.254026, 2.413))
            ThreePointArc((-2.254026, 2.413), (0, -3.302), (2.254026, 2.413))
        make_face()
    extrude(amount=F6_DEPTH, mode=Mode.SUBTRACT)

    # F7 (on Top) → F8 (cut)
    with BuildSketch(Plane.XY):
        Circle(F7_R)
    extrude(amount=F8_DEPTH, mode=Mode.SUBTRACT)


solid = f1.part
